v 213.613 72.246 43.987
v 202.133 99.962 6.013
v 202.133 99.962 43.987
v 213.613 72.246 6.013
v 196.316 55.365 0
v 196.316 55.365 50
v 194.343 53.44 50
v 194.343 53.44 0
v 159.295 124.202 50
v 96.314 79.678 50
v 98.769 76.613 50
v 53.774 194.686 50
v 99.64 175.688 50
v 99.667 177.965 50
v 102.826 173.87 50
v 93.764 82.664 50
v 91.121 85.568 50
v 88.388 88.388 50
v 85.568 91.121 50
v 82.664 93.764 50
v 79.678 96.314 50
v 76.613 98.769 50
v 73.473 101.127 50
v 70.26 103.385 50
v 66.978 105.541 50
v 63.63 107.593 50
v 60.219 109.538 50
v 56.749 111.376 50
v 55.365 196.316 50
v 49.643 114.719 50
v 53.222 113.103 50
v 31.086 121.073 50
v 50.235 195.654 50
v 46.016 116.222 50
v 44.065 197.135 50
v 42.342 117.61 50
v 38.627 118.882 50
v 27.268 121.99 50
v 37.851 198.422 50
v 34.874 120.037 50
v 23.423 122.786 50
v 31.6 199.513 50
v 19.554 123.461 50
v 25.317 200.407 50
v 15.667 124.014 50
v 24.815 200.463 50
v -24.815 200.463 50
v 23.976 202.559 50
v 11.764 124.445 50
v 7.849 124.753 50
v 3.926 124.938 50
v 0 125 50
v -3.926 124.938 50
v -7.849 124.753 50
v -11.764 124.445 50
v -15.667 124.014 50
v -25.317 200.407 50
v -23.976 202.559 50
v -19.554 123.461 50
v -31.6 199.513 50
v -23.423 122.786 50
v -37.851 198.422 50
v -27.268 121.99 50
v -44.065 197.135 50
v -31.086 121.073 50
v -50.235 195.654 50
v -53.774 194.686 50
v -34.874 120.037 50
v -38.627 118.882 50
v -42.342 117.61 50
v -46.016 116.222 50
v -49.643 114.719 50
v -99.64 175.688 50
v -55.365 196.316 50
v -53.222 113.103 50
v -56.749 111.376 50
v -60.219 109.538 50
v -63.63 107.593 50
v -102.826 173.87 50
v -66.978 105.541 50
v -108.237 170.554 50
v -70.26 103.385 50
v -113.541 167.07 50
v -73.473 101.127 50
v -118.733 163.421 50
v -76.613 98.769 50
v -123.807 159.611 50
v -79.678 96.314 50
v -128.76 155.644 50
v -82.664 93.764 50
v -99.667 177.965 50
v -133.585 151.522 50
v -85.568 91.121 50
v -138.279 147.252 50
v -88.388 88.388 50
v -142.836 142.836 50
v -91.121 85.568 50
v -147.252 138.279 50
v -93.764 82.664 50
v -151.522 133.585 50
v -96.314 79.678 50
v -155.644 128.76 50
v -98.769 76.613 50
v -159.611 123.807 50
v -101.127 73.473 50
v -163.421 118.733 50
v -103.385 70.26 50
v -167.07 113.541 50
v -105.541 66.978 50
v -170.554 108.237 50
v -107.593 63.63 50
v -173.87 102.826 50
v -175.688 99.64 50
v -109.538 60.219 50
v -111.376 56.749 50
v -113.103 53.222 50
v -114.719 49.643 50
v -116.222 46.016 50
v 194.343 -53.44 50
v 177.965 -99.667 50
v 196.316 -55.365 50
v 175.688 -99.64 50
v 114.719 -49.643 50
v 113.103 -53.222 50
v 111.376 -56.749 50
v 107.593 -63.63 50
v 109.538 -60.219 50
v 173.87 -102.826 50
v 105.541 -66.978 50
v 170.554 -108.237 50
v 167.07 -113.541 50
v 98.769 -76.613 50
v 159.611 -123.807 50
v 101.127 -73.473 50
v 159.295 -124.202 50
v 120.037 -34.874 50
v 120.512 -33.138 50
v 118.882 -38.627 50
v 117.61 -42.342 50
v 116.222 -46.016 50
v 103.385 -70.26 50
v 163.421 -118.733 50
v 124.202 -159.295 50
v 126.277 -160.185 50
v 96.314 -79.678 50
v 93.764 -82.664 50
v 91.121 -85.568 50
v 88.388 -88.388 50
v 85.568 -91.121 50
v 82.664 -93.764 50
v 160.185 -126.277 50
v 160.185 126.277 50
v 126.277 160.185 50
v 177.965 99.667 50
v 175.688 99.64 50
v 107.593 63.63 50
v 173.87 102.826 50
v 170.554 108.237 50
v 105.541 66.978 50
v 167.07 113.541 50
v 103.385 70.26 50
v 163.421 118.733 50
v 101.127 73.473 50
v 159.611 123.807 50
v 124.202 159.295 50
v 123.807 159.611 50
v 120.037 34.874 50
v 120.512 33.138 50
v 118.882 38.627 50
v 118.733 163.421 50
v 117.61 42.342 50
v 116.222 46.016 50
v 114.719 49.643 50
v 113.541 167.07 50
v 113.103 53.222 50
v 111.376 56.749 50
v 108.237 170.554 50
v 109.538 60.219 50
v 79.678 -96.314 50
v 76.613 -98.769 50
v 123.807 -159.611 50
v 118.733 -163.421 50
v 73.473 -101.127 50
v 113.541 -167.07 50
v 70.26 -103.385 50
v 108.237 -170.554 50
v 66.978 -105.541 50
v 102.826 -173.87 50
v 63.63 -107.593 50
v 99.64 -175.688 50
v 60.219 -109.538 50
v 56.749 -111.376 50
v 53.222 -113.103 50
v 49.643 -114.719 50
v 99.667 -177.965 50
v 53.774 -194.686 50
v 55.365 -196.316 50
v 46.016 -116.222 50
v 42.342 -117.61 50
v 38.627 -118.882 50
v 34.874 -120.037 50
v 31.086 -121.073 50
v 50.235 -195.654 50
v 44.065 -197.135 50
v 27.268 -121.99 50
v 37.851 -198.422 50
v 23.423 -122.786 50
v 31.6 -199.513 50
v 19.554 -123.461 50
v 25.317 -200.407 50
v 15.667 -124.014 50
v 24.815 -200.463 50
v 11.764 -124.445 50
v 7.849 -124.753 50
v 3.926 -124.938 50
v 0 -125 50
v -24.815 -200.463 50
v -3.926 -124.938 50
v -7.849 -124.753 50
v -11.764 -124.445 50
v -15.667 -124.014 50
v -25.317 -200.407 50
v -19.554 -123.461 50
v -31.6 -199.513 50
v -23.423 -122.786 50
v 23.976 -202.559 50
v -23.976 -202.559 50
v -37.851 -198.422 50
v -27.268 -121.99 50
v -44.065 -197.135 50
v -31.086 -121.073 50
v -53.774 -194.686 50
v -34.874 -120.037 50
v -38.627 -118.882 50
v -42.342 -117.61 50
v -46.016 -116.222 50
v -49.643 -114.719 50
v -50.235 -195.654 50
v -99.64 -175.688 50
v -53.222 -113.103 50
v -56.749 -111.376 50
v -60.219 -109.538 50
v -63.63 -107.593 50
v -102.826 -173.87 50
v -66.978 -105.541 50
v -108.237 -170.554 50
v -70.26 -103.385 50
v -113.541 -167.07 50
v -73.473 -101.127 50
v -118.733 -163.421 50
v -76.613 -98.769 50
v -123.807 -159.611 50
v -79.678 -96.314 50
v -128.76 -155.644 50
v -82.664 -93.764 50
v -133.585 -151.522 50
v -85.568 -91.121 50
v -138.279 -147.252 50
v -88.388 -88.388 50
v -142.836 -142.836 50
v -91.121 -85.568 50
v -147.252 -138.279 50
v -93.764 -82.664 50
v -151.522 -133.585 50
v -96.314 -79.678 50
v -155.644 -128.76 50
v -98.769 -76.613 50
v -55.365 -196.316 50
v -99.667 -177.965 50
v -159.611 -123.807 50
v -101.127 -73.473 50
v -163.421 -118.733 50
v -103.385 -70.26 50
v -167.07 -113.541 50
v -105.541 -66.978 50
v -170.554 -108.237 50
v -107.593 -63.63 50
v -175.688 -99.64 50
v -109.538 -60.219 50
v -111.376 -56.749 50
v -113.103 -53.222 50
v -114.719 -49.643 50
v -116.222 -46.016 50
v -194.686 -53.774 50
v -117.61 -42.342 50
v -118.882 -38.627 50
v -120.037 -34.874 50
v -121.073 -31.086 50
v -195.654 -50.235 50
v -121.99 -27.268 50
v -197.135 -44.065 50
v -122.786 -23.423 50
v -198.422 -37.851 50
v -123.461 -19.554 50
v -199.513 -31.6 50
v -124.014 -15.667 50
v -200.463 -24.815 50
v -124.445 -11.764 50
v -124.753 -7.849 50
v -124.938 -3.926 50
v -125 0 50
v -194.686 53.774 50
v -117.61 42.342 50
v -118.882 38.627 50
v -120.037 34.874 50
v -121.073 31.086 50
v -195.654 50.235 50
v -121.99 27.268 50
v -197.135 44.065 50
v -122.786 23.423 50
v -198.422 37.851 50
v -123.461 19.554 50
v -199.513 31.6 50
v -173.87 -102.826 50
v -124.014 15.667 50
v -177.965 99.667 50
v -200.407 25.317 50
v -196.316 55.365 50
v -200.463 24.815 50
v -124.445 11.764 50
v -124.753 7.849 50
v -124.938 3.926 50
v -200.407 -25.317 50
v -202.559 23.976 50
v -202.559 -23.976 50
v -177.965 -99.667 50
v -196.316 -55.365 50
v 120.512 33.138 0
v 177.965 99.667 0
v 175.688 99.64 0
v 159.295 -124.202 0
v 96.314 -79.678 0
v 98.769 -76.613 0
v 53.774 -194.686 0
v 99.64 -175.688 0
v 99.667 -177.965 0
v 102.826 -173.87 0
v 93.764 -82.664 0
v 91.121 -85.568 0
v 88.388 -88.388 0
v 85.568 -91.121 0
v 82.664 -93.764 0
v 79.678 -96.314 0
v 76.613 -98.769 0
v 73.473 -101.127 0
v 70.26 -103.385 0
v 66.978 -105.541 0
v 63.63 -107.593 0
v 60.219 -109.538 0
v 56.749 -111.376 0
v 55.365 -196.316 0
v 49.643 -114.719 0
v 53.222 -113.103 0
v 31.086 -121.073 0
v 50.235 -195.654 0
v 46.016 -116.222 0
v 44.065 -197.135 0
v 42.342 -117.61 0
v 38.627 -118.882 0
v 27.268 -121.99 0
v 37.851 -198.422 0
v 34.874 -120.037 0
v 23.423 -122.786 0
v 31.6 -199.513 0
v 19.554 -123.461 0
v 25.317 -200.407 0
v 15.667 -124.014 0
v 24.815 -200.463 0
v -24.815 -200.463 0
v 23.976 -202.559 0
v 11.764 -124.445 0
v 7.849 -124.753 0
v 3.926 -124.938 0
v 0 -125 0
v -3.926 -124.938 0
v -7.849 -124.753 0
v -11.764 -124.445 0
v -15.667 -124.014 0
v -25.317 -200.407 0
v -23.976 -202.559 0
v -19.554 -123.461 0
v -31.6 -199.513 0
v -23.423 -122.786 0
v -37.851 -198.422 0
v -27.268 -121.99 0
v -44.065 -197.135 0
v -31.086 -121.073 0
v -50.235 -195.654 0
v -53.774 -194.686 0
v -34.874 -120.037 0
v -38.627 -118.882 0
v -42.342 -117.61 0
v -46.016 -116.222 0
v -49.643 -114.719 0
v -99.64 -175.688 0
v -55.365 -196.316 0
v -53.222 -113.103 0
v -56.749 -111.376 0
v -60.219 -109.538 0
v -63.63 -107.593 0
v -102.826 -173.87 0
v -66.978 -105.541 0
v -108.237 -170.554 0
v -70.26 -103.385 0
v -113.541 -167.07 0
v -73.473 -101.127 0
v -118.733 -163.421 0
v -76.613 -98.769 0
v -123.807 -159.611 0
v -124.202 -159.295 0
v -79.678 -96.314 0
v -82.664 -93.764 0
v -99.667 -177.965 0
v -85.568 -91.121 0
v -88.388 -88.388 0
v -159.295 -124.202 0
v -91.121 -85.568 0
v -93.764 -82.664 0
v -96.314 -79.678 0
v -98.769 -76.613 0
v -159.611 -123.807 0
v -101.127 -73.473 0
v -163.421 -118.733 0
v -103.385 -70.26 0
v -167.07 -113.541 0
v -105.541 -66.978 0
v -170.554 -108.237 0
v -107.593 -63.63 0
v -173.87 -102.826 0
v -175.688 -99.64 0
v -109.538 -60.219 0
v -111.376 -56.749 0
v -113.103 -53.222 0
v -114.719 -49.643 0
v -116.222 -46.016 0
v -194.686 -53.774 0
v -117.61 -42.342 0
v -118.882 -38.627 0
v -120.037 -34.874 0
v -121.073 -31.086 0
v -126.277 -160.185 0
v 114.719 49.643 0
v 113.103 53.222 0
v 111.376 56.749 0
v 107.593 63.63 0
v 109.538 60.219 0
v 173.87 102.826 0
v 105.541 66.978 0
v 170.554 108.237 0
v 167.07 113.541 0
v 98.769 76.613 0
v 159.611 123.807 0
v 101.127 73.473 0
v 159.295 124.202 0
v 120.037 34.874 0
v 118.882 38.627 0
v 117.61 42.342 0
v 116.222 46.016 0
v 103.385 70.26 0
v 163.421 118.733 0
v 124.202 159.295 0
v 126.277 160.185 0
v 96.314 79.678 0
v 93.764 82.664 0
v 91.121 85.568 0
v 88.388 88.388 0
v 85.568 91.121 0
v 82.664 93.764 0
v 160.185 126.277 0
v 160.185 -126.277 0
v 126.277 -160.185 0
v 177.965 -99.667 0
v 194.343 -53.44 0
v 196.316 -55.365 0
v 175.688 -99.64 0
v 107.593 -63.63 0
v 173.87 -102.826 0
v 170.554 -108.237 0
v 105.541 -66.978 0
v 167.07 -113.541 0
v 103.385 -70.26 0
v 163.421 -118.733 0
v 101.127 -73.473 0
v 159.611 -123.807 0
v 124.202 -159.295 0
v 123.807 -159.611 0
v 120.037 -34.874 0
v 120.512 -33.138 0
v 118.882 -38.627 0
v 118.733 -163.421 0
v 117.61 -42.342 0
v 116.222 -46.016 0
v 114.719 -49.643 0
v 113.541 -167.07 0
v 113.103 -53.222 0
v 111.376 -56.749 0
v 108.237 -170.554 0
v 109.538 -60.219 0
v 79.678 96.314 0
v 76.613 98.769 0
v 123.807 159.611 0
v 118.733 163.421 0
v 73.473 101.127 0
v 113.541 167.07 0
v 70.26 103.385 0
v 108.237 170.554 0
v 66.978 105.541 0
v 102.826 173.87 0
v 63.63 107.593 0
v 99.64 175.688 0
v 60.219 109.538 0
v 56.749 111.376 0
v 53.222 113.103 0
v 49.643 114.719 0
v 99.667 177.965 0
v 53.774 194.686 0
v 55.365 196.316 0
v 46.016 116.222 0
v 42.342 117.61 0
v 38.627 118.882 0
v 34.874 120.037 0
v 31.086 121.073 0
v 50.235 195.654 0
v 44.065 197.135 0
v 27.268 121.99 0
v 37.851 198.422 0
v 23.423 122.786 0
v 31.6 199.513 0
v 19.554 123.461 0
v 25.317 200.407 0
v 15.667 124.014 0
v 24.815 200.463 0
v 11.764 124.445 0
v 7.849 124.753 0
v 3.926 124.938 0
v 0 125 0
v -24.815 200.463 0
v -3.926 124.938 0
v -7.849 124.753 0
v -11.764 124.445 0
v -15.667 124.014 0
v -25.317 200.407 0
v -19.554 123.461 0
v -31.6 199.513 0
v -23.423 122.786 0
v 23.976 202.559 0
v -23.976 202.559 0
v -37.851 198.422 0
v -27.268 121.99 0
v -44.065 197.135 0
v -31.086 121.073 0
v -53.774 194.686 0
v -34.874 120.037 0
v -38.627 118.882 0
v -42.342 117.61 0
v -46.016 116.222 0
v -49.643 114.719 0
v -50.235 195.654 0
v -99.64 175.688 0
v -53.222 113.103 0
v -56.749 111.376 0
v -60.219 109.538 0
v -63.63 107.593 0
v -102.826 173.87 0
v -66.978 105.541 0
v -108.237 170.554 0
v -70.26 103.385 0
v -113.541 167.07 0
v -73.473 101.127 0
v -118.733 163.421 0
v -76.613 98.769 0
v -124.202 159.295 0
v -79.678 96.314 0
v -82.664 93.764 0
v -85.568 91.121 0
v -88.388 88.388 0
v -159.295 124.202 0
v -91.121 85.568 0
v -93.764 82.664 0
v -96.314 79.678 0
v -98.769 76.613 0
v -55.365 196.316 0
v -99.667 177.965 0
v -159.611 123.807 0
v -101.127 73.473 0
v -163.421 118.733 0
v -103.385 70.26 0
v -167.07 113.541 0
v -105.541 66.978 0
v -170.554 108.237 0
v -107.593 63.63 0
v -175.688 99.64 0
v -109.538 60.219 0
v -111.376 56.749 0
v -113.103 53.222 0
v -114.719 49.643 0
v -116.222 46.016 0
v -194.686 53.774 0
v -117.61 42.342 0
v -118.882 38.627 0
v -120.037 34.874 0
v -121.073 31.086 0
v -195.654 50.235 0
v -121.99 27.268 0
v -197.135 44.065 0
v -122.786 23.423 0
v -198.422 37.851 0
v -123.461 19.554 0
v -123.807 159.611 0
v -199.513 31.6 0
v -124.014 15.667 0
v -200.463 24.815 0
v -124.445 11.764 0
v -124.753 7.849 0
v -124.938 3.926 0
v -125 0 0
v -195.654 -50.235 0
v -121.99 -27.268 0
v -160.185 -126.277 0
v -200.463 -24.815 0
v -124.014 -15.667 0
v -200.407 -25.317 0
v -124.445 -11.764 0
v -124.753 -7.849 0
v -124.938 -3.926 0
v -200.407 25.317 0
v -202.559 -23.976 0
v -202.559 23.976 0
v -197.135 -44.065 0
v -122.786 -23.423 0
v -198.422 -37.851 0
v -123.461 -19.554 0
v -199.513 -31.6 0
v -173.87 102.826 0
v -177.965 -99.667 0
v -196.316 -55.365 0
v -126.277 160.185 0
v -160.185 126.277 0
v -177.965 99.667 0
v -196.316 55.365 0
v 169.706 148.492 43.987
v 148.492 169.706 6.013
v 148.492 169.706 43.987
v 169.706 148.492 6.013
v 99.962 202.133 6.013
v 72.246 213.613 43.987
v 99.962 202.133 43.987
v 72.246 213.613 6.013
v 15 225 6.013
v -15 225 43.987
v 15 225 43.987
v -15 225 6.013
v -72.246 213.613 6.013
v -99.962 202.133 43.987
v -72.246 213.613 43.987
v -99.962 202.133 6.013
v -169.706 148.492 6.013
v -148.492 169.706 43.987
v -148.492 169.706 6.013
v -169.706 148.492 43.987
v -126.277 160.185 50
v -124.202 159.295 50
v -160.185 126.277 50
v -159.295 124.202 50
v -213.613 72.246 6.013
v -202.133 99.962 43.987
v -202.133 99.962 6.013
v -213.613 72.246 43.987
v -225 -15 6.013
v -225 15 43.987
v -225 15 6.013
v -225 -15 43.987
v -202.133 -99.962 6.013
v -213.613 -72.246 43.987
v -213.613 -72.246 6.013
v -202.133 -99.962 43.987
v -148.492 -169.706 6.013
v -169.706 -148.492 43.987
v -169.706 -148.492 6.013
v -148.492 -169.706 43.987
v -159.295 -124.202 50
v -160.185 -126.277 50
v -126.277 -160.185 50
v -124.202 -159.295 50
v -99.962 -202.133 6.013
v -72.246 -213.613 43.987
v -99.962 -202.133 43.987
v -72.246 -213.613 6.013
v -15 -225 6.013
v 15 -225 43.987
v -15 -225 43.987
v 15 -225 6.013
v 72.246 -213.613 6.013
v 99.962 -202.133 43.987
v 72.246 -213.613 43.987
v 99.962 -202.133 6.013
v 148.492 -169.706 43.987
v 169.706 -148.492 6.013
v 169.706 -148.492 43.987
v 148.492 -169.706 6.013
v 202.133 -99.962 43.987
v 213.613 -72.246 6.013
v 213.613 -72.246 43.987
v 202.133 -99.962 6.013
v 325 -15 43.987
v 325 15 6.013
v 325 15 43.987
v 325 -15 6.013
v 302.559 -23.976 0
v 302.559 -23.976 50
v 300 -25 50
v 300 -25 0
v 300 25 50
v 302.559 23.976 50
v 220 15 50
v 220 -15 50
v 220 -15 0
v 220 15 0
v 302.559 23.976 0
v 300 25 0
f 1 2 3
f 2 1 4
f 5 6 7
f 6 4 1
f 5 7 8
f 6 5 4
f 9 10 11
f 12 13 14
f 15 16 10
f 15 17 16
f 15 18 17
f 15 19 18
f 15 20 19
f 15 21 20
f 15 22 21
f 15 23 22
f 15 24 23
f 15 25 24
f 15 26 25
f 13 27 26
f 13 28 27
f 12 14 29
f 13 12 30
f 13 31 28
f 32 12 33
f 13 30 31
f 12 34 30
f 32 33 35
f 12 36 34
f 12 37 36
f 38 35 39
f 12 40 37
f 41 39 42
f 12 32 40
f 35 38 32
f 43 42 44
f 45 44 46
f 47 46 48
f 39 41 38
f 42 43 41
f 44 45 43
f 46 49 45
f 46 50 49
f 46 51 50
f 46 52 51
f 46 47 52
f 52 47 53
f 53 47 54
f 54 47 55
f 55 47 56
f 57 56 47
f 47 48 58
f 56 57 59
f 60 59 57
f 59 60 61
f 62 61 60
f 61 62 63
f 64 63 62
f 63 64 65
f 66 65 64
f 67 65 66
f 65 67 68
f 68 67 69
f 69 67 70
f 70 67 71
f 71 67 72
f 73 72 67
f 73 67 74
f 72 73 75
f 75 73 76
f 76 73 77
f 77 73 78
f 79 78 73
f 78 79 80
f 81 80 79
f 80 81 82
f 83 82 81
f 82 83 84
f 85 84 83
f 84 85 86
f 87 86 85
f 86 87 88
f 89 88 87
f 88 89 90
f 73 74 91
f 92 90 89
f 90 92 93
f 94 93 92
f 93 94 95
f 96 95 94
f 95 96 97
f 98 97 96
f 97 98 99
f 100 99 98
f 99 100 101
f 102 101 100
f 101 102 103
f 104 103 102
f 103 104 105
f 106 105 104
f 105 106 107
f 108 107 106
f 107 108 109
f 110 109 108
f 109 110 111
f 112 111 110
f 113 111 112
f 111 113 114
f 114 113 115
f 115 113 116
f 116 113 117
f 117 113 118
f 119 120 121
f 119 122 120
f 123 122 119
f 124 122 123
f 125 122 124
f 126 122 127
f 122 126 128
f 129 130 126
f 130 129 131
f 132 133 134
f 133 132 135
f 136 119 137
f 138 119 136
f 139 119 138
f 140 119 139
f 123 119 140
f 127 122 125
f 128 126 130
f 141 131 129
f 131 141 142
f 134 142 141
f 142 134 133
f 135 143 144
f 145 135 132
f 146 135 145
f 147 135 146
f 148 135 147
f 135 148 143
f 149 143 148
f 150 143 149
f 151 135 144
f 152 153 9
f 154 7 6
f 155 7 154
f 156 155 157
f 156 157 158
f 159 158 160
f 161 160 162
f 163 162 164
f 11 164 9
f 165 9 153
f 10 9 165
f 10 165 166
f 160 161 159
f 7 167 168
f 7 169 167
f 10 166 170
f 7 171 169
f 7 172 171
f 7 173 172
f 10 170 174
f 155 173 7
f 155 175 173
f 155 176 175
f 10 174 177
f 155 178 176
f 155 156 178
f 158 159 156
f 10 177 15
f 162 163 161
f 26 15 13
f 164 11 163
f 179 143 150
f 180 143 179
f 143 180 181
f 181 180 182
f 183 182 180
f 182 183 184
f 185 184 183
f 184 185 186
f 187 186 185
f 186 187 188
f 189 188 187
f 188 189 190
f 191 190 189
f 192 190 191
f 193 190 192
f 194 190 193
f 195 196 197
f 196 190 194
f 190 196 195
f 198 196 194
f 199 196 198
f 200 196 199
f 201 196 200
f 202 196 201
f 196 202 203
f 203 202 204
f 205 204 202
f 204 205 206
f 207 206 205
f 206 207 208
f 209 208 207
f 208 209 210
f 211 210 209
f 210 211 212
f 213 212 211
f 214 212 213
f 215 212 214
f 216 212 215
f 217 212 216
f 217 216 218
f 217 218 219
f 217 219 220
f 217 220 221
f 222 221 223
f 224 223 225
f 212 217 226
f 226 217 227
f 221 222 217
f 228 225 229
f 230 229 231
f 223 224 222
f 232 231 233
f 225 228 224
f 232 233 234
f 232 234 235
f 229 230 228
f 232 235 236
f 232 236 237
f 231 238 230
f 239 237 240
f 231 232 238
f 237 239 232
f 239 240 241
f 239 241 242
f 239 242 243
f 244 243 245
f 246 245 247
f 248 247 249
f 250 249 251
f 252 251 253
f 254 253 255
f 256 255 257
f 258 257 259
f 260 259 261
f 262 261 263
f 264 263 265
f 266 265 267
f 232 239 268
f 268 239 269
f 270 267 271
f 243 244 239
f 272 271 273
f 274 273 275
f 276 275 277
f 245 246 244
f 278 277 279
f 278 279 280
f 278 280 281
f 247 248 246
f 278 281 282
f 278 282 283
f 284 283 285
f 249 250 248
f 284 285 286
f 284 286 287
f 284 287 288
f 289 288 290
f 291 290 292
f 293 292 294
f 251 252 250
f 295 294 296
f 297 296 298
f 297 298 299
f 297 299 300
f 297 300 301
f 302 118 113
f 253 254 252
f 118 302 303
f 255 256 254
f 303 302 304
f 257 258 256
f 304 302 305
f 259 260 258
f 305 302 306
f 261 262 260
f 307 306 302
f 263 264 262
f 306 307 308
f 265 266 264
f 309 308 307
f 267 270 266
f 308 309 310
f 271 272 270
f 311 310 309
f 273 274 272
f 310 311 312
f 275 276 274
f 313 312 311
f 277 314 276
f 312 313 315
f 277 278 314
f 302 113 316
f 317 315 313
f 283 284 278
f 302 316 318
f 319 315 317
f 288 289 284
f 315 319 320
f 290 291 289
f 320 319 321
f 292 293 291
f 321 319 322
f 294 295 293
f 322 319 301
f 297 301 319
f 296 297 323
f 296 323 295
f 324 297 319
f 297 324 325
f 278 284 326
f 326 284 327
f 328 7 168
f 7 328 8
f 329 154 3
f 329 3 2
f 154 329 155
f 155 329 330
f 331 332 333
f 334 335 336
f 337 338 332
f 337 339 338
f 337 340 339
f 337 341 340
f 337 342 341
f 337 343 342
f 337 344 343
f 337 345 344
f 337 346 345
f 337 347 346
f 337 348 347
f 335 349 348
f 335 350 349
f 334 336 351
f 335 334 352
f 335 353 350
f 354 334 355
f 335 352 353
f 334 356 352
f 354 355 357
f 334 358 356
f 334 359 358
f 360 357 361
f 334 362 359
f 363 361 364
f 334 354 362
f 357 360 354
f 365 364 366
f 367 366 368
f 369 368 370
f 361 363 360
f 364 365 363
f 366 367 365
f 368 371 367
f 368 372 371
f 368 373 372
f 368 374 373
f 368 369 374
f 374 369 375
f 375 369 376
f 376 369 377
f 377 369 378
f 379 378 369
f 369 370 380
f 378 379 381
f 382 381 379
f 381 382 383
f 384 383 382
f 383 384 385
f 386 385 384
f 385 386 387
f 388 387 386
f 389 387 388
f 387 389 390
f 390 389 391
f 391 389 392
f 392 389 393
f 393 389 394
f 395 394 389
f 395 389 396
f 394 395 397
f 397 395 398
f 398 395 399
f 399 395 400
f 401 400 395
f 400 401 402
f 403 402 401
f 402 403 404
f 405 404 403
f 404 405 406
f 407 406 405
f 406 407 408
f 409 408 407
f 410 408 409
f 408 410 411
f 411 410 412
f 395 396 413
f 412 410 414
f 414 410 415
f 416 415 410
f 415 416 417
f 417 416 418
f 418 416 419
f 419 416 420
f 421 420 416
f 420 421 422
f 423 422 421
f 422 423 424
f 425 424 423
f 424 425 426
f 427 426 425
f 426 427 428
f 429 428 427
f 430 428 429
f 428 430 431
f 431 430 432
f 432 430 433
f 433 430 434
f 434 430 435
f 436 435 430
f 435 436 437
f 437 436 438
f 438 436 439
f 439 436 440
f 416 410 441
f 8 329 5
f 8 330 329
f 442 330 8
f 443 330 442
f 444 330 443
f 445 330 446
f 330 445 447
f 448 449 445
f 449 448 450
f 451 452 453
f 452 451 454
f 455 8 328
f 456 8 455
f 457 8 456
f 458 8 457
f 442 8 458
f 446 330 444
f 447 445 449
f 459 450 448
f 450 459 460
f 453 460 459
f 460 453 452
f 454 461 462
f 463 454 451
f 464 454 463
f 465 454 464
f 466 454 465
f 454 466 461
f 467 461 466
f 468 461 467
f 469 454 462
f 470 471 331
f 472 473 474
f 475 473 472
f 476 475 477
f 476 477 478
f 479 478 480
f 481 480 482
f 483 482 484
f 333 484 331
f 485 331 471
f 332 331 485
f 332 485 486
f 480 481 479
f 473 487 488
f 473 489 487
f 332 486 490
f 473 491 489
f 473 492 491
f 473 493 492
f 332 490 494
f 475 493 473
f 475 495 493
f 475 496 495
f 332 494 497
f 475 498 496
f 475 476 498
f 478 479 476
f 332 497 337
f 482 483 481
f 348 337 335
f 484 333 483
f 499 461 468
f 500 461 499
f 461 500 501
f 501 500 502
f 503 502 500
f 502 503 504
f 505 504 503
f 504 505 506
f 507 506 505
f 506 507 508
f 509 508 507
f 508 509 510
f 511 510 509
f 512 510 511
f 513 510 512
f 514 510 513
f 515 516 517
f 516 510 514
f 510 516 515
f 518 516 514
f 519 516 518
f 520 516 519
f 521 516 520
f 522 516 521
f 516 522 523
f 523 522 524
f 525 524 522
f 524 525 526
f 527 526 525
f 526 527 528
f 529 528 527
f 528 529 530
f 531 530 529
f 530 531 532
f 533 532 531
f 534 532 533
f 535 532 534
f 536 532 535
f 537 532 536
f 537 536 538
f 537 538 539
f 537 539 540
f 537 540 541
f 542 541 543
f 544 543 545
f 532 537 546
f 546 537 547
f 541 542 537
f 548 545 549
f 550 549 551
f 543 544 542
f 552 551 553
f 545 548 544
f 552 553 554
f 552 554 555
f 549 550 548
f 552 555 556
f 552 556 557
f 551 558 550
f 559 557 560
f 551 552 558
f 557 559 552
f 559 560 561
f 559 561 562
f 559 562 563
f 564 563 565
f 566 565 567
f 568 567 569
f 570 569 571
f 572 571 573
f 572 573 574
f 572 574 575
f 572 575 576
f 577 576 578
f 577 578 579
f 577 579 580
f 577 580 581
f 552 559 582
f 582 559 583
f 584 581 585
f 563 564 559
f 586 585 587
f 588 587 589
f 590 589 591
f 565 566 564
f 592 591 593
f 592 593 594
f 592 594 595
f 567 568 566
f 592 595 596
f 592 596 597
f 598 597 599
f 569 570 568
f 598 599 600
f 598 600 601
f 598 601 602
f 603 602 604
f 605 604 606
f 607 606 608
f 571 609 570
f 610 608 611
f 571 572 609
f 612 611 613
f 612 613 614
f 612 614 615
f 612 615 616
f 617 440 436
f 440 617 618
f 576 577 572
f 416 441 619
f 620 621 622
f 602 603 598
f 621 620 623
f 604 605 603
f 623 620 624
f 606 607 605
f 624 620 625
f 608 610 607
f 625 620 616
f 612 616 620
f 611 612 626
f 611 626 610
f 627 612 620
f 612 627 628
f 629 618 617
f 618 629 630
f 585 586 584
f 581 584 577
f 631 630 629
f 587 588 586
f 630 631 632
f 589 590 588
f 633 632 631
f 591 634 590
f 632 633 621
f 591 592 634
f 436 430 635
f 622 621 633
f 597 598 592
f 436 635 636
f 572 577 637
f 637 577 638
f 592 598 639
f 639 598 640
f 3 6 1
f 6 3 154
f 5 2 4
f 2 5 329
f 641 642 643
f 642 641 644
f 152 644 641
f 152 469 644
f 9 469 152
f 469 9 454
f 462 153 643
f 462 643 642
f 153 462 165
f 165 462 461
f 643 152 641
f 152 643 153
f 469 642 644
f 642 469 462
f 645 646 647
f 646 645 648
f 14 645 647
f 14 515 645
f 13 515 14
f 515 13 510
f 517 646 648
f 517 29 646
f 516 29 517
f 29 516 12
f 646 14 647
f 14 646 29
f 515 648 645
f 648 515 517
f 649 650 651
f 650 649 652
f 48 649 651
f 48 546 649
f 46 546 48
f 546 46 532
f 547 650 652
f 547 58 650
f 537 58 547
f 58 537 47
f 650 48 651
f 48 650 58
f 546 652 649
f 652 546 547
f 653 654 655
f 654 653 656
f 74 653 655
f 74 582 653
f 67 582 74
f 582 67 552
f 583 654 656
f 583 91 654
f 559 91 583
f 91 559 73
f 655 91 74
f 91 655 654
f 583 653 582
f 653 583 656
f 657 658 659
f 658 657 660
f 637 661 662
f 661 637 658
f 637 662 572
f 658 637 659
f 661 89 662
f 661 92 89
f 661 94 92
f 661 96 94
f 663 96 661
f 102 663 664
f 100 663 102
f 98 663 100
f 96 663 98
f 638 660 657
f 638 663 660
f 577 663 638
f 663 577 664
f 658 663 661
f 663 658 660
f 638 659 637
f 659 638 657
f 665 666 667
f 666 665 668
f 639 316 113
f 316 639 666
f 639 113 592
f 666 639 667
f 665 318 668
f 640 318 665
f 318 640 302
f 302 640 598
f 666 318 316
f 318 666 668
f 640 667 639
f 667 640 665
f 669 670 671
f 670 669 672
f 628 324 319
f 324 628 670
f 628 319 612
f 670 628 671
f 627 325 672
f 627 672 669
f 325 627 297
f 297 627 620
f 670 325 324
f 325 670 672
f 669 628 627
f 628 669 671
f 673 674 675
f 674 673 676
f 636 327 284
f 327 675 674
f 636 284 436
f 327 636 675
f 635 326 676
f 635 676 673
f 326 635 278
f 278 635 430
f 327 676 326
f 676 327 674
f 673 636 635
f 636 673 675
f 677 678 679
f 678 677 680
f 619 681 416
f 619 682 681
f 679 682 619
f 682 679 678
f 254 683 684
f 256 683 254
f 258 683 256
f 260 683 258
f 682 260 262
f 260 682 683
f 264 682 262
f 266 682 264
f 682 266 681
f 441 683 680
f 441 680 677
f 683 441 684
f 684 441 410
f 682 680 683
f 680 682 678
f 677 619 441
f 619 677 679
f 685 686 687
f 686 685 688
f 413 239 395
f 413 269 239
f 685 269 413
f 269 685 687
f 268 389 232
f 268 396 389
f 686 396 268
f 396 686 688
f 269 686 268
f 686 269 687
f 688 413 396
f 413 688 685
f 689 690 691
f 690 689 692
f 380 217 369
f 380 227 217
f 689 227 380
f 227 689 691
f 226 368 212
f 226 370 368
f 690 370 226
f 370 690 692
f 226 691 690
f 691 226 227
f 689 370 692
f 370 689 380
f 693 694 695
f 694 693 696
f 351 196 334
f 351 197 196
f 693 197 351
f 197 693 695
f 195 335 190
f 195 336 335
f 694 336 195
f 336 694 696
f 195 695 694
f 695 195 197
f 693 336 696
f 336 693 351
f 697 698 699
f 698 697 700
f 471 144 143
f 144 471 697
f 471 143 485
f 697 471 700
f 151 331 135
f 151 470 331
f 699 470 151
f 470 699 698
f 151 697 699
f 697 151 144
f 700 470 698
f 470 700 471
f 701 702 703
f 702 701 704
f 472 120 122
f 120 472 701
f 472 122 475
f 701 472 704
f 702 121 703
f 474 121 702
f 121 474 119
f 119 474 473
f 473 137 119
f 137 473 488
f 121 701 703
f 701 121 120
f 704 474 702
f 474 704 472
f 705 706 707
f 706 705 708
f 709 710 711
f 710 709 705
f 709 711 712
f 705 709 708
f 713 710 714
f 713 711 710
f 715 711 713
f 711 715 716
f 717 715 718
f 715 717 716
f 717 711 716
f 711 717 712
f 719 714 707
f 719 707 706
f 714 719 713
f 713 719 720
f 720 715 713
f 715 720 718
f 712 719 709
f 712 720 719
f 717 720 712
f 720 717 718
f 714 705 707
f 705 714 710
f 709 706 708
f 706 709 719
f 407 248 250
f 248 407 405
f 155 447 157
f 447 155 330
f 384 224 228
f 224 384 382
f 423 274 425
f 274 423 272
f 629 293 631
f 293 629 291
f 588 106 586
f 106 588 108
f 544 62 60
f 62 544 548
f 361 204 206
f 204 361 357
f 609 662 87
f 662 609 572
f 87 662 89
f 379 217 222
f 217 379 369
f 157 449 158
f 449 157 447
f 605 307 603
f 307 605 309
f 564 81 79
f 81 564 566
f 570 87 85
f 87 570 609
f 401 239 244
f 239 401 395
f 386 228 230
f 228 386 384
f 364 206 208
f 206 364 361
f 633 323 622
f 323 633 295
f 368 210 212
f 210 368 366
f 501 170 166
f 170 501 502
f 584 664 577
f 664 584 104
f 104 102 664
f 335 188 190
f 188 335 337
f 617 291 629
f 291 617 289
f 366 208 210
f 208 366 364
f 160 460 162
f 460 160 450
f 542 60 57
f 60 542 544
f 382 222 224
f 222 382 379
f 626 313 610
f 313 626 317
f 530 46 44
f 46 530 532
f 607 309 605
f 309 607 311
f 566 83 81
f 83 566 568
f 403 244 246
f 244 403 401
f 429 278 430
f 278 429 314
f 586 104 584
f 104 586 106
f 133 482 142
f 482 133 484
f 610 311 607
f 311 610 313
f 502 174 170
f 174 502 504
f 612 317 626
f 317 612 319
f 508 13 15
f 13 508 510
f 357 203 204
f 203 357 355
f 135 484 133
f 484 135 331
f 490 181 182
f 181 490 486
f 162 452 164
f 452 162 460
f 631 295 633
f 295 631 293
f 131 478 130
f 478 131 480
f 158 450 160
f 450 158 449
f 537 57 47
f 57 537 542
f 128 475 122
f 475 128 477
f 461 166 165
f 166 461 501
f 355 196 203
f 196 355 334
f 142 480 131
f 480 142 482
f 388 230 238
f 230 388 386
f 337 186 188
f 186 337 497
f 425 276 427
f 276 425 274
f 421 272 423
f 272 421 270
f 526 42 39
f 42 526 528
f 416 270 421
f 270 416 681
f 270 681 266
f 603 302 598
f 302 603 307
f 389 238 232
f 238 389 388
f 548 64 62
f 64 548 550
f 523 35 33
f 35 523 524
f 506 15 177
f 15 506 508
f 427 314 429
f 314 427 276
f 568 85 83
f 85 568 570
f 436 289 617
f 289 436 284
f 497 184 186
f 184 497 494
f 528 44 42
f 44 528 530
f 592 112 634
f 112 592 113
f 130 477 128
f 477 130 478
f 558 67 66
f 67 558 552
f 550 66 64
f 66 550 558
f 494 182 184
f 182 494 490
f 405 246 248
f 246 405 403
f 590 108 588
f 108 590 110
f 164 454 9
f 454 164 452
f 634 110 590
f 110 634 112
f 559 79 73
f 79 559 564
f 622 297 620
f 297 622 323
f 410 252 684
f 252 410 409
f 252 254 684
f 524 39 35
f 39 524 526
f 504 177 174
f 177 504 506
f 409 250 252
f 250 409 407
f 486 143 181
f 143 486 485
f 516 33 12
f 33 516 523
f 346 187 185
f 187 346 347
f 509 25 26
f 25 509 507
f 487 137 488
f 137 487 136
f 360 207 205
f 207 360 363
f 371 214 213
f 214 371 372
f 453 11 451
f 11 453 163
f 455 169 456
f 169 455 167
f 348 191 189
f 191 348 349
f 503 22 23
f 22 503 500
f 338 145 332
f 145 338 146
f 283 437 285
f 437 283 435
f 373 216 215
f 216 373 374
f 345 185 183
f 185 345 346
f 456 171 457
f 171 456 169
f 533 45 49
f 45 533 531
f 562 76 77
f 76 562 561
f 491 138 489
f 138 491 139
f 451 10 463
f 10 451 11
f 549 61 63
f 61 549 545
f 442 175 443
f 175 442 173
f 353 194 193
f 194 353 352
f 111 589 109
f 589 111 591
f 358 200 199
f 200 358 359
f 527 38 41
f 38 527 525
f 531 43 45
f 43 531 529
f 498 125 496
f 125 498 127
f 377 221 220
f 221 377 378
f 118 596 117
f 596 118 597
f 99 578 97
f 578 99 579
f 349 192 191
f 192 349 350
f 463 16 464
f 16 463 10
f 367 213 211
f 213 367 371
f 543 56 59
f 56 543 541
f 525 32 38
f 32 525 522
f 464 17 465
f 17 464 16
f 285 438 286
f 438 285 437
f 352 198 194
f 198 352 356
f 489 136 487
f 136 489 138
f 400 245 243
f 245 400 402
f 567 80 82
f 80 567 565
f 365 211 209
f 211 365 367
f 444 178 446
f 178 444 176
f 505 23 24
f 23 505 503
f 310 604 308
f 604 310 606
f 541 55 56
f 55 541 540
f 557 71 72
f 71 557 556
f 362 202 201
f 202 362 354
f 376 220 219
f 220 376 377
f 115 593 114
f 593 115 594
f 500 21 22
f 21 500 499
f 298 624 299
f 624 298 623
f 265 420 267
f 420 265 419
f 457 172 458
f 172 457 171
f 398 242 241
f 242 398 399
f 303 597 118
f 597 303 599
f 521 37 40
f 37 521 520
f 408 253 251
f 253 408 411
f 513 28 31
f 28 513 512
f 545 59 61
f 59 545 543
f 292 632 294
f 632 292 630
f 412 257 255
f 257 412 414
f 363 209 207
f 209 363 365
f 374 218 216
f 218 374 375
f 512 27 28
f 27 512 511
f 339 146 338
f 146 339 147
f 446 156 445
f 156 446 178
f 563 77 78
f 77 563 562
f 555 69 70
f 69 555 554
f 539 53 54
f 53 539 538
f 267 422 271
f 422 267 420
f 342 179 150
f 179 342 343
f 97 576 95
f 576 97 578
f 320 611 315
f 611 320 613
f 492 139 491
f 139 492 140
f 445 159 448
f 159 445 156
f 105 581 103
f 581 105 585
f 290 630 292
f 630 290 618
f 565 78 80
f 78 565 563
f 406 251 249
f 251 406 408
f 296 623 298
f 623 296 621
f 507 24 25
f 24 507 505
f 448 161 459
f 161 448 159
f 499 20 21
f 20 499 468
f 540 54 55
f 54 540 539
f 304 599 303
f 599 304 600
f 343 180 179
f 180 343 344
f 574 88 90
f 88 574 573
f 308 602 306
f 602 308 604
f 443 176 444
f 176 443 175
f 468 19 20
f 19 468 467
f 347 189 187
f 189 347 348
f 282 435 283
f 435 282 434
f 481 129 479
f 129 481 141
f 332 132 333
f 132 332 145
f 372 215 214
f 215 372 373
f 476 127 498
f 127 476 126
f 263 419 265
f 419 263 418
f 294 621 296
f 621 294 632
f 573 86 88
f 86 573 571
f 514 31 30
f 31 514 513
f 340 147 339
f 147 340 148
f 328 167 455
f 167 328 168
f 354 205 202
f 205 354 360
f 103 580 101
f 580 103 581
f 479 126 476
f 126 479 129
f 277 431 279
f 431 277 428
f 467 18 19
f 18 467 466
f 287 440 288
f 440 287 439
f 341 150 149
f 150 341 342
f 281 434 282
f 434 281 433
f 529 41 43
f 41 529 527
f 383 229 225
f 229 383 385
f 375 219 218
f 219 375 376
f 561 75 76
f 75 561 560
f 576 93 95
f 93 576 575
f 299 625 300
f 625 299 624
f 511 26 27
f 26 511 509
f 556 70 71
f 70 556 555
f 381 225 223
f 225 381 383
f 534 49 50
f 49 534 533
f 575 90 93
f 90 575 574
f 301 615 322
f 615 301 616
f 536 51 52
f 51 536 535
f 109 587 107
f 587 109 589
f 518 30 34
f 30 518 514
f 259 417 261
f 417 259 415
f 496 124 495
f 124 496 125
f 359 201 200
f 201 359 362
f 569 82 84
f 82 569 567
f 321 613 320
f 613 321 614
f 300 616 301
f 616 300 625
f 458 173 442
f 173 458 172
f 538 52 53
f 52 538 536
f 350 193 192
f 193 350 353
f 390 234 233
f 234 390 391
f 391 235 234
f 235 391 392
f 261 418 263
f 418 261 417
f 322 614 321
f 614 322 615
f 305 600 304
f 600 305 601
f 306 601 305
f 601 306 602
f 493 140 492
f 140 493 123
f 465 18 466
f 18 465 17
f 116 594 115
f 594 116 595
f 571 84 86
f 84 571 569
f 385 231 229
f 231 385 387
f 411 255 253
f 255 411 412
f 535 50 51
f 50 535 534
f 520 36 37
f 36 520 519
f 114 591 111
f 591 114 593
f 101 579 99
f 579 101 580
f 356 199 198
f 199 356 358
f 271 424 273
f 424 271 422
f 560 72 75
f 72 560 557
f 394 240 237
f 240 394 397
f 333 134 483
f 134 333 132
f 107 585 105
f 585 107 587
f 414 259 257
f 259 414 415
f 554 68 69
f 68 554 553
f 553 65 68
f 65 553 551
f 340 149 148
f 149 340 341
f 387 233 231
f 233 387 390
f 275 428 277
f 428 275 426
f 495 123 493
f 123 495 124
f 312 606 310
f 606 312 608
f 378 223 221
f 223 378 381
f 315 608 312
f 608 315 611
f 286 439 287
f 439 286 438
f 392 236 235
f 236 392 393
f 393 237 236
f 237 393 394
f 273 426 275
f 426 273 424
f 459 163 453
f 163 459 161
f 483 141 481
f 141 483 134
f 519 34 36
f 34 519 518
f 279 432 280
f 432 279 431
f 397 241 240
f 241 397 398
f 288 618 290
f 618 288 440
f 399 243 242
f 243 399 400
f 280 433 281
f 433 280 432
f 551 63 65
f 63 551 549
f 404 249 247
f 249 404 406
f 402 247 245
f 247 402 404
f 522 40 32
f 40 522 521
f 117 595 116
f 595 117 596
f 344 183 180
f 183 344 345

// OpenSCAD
radius = 200;
pieces = 16;
logo_height = 50;
extracted_pieces = 1;
extracted_pieces_distance = 100;
angle = 0;

module circl()
{

	difference() {

		union() {
			for (i = [1:pieces - extracted_pieces]) {
				rotate(i * 360/pieces, [0,0,1])
					translate([radius,0,logo_height / 2])
						tooth(logo_height);
			}
		
			for (i = [1:extracted_pieces]) {
				rotate(i * 360/pieces + ((pieces - extracted_pieces) * 360/pieces), [0,0,1])
					translate([radius + extracted_pieces_distance,0,logo_height / 2])
					tooth(logo_height);
			}

			difference() {
				cylinder(h = logo_height, r1 = radius + 2, r2 = radius + 2, $fn=200);
				for (i = [1:extracted_pieces]) {
					rotate(i * 360/pieces + ((pieces - extracted_pieces) * 360/pieces), [0,0,1])
						translate([radius,0,logo_height / 2])
							tooth(logo_height + 2, 2.2, 2.2);
				}
			}	
		}

		translate([0,0,-1])
			cylinder(h = logo_height + 2, r1 = 125, r2 = 125, $fn=200);	
	}
}

module tooth(thickness, weight=1, height=1) 
{	
	rotate(270) {
		difference() {
			linear_extrude(height = thickness, center = true, convexity = 10, twist = 0)
				polygon(points=[ [15*weight,-80*height],
								[25*weight,0*height],
								[15*weight,25*height],
								[-15*weight,25*height],
								[-25*weight,0*height],
								[-15*weight,-80*height]]);
			translate([0,30,28])
				rotate(75, [1,0,0])
					cube(size = [50,20,60], center = true);

			translate([0,30,-28])
				rotate(285, [1,0,0])
					cube(size = [50,20,60], center = true);
			
		}
	}
}

circl();
